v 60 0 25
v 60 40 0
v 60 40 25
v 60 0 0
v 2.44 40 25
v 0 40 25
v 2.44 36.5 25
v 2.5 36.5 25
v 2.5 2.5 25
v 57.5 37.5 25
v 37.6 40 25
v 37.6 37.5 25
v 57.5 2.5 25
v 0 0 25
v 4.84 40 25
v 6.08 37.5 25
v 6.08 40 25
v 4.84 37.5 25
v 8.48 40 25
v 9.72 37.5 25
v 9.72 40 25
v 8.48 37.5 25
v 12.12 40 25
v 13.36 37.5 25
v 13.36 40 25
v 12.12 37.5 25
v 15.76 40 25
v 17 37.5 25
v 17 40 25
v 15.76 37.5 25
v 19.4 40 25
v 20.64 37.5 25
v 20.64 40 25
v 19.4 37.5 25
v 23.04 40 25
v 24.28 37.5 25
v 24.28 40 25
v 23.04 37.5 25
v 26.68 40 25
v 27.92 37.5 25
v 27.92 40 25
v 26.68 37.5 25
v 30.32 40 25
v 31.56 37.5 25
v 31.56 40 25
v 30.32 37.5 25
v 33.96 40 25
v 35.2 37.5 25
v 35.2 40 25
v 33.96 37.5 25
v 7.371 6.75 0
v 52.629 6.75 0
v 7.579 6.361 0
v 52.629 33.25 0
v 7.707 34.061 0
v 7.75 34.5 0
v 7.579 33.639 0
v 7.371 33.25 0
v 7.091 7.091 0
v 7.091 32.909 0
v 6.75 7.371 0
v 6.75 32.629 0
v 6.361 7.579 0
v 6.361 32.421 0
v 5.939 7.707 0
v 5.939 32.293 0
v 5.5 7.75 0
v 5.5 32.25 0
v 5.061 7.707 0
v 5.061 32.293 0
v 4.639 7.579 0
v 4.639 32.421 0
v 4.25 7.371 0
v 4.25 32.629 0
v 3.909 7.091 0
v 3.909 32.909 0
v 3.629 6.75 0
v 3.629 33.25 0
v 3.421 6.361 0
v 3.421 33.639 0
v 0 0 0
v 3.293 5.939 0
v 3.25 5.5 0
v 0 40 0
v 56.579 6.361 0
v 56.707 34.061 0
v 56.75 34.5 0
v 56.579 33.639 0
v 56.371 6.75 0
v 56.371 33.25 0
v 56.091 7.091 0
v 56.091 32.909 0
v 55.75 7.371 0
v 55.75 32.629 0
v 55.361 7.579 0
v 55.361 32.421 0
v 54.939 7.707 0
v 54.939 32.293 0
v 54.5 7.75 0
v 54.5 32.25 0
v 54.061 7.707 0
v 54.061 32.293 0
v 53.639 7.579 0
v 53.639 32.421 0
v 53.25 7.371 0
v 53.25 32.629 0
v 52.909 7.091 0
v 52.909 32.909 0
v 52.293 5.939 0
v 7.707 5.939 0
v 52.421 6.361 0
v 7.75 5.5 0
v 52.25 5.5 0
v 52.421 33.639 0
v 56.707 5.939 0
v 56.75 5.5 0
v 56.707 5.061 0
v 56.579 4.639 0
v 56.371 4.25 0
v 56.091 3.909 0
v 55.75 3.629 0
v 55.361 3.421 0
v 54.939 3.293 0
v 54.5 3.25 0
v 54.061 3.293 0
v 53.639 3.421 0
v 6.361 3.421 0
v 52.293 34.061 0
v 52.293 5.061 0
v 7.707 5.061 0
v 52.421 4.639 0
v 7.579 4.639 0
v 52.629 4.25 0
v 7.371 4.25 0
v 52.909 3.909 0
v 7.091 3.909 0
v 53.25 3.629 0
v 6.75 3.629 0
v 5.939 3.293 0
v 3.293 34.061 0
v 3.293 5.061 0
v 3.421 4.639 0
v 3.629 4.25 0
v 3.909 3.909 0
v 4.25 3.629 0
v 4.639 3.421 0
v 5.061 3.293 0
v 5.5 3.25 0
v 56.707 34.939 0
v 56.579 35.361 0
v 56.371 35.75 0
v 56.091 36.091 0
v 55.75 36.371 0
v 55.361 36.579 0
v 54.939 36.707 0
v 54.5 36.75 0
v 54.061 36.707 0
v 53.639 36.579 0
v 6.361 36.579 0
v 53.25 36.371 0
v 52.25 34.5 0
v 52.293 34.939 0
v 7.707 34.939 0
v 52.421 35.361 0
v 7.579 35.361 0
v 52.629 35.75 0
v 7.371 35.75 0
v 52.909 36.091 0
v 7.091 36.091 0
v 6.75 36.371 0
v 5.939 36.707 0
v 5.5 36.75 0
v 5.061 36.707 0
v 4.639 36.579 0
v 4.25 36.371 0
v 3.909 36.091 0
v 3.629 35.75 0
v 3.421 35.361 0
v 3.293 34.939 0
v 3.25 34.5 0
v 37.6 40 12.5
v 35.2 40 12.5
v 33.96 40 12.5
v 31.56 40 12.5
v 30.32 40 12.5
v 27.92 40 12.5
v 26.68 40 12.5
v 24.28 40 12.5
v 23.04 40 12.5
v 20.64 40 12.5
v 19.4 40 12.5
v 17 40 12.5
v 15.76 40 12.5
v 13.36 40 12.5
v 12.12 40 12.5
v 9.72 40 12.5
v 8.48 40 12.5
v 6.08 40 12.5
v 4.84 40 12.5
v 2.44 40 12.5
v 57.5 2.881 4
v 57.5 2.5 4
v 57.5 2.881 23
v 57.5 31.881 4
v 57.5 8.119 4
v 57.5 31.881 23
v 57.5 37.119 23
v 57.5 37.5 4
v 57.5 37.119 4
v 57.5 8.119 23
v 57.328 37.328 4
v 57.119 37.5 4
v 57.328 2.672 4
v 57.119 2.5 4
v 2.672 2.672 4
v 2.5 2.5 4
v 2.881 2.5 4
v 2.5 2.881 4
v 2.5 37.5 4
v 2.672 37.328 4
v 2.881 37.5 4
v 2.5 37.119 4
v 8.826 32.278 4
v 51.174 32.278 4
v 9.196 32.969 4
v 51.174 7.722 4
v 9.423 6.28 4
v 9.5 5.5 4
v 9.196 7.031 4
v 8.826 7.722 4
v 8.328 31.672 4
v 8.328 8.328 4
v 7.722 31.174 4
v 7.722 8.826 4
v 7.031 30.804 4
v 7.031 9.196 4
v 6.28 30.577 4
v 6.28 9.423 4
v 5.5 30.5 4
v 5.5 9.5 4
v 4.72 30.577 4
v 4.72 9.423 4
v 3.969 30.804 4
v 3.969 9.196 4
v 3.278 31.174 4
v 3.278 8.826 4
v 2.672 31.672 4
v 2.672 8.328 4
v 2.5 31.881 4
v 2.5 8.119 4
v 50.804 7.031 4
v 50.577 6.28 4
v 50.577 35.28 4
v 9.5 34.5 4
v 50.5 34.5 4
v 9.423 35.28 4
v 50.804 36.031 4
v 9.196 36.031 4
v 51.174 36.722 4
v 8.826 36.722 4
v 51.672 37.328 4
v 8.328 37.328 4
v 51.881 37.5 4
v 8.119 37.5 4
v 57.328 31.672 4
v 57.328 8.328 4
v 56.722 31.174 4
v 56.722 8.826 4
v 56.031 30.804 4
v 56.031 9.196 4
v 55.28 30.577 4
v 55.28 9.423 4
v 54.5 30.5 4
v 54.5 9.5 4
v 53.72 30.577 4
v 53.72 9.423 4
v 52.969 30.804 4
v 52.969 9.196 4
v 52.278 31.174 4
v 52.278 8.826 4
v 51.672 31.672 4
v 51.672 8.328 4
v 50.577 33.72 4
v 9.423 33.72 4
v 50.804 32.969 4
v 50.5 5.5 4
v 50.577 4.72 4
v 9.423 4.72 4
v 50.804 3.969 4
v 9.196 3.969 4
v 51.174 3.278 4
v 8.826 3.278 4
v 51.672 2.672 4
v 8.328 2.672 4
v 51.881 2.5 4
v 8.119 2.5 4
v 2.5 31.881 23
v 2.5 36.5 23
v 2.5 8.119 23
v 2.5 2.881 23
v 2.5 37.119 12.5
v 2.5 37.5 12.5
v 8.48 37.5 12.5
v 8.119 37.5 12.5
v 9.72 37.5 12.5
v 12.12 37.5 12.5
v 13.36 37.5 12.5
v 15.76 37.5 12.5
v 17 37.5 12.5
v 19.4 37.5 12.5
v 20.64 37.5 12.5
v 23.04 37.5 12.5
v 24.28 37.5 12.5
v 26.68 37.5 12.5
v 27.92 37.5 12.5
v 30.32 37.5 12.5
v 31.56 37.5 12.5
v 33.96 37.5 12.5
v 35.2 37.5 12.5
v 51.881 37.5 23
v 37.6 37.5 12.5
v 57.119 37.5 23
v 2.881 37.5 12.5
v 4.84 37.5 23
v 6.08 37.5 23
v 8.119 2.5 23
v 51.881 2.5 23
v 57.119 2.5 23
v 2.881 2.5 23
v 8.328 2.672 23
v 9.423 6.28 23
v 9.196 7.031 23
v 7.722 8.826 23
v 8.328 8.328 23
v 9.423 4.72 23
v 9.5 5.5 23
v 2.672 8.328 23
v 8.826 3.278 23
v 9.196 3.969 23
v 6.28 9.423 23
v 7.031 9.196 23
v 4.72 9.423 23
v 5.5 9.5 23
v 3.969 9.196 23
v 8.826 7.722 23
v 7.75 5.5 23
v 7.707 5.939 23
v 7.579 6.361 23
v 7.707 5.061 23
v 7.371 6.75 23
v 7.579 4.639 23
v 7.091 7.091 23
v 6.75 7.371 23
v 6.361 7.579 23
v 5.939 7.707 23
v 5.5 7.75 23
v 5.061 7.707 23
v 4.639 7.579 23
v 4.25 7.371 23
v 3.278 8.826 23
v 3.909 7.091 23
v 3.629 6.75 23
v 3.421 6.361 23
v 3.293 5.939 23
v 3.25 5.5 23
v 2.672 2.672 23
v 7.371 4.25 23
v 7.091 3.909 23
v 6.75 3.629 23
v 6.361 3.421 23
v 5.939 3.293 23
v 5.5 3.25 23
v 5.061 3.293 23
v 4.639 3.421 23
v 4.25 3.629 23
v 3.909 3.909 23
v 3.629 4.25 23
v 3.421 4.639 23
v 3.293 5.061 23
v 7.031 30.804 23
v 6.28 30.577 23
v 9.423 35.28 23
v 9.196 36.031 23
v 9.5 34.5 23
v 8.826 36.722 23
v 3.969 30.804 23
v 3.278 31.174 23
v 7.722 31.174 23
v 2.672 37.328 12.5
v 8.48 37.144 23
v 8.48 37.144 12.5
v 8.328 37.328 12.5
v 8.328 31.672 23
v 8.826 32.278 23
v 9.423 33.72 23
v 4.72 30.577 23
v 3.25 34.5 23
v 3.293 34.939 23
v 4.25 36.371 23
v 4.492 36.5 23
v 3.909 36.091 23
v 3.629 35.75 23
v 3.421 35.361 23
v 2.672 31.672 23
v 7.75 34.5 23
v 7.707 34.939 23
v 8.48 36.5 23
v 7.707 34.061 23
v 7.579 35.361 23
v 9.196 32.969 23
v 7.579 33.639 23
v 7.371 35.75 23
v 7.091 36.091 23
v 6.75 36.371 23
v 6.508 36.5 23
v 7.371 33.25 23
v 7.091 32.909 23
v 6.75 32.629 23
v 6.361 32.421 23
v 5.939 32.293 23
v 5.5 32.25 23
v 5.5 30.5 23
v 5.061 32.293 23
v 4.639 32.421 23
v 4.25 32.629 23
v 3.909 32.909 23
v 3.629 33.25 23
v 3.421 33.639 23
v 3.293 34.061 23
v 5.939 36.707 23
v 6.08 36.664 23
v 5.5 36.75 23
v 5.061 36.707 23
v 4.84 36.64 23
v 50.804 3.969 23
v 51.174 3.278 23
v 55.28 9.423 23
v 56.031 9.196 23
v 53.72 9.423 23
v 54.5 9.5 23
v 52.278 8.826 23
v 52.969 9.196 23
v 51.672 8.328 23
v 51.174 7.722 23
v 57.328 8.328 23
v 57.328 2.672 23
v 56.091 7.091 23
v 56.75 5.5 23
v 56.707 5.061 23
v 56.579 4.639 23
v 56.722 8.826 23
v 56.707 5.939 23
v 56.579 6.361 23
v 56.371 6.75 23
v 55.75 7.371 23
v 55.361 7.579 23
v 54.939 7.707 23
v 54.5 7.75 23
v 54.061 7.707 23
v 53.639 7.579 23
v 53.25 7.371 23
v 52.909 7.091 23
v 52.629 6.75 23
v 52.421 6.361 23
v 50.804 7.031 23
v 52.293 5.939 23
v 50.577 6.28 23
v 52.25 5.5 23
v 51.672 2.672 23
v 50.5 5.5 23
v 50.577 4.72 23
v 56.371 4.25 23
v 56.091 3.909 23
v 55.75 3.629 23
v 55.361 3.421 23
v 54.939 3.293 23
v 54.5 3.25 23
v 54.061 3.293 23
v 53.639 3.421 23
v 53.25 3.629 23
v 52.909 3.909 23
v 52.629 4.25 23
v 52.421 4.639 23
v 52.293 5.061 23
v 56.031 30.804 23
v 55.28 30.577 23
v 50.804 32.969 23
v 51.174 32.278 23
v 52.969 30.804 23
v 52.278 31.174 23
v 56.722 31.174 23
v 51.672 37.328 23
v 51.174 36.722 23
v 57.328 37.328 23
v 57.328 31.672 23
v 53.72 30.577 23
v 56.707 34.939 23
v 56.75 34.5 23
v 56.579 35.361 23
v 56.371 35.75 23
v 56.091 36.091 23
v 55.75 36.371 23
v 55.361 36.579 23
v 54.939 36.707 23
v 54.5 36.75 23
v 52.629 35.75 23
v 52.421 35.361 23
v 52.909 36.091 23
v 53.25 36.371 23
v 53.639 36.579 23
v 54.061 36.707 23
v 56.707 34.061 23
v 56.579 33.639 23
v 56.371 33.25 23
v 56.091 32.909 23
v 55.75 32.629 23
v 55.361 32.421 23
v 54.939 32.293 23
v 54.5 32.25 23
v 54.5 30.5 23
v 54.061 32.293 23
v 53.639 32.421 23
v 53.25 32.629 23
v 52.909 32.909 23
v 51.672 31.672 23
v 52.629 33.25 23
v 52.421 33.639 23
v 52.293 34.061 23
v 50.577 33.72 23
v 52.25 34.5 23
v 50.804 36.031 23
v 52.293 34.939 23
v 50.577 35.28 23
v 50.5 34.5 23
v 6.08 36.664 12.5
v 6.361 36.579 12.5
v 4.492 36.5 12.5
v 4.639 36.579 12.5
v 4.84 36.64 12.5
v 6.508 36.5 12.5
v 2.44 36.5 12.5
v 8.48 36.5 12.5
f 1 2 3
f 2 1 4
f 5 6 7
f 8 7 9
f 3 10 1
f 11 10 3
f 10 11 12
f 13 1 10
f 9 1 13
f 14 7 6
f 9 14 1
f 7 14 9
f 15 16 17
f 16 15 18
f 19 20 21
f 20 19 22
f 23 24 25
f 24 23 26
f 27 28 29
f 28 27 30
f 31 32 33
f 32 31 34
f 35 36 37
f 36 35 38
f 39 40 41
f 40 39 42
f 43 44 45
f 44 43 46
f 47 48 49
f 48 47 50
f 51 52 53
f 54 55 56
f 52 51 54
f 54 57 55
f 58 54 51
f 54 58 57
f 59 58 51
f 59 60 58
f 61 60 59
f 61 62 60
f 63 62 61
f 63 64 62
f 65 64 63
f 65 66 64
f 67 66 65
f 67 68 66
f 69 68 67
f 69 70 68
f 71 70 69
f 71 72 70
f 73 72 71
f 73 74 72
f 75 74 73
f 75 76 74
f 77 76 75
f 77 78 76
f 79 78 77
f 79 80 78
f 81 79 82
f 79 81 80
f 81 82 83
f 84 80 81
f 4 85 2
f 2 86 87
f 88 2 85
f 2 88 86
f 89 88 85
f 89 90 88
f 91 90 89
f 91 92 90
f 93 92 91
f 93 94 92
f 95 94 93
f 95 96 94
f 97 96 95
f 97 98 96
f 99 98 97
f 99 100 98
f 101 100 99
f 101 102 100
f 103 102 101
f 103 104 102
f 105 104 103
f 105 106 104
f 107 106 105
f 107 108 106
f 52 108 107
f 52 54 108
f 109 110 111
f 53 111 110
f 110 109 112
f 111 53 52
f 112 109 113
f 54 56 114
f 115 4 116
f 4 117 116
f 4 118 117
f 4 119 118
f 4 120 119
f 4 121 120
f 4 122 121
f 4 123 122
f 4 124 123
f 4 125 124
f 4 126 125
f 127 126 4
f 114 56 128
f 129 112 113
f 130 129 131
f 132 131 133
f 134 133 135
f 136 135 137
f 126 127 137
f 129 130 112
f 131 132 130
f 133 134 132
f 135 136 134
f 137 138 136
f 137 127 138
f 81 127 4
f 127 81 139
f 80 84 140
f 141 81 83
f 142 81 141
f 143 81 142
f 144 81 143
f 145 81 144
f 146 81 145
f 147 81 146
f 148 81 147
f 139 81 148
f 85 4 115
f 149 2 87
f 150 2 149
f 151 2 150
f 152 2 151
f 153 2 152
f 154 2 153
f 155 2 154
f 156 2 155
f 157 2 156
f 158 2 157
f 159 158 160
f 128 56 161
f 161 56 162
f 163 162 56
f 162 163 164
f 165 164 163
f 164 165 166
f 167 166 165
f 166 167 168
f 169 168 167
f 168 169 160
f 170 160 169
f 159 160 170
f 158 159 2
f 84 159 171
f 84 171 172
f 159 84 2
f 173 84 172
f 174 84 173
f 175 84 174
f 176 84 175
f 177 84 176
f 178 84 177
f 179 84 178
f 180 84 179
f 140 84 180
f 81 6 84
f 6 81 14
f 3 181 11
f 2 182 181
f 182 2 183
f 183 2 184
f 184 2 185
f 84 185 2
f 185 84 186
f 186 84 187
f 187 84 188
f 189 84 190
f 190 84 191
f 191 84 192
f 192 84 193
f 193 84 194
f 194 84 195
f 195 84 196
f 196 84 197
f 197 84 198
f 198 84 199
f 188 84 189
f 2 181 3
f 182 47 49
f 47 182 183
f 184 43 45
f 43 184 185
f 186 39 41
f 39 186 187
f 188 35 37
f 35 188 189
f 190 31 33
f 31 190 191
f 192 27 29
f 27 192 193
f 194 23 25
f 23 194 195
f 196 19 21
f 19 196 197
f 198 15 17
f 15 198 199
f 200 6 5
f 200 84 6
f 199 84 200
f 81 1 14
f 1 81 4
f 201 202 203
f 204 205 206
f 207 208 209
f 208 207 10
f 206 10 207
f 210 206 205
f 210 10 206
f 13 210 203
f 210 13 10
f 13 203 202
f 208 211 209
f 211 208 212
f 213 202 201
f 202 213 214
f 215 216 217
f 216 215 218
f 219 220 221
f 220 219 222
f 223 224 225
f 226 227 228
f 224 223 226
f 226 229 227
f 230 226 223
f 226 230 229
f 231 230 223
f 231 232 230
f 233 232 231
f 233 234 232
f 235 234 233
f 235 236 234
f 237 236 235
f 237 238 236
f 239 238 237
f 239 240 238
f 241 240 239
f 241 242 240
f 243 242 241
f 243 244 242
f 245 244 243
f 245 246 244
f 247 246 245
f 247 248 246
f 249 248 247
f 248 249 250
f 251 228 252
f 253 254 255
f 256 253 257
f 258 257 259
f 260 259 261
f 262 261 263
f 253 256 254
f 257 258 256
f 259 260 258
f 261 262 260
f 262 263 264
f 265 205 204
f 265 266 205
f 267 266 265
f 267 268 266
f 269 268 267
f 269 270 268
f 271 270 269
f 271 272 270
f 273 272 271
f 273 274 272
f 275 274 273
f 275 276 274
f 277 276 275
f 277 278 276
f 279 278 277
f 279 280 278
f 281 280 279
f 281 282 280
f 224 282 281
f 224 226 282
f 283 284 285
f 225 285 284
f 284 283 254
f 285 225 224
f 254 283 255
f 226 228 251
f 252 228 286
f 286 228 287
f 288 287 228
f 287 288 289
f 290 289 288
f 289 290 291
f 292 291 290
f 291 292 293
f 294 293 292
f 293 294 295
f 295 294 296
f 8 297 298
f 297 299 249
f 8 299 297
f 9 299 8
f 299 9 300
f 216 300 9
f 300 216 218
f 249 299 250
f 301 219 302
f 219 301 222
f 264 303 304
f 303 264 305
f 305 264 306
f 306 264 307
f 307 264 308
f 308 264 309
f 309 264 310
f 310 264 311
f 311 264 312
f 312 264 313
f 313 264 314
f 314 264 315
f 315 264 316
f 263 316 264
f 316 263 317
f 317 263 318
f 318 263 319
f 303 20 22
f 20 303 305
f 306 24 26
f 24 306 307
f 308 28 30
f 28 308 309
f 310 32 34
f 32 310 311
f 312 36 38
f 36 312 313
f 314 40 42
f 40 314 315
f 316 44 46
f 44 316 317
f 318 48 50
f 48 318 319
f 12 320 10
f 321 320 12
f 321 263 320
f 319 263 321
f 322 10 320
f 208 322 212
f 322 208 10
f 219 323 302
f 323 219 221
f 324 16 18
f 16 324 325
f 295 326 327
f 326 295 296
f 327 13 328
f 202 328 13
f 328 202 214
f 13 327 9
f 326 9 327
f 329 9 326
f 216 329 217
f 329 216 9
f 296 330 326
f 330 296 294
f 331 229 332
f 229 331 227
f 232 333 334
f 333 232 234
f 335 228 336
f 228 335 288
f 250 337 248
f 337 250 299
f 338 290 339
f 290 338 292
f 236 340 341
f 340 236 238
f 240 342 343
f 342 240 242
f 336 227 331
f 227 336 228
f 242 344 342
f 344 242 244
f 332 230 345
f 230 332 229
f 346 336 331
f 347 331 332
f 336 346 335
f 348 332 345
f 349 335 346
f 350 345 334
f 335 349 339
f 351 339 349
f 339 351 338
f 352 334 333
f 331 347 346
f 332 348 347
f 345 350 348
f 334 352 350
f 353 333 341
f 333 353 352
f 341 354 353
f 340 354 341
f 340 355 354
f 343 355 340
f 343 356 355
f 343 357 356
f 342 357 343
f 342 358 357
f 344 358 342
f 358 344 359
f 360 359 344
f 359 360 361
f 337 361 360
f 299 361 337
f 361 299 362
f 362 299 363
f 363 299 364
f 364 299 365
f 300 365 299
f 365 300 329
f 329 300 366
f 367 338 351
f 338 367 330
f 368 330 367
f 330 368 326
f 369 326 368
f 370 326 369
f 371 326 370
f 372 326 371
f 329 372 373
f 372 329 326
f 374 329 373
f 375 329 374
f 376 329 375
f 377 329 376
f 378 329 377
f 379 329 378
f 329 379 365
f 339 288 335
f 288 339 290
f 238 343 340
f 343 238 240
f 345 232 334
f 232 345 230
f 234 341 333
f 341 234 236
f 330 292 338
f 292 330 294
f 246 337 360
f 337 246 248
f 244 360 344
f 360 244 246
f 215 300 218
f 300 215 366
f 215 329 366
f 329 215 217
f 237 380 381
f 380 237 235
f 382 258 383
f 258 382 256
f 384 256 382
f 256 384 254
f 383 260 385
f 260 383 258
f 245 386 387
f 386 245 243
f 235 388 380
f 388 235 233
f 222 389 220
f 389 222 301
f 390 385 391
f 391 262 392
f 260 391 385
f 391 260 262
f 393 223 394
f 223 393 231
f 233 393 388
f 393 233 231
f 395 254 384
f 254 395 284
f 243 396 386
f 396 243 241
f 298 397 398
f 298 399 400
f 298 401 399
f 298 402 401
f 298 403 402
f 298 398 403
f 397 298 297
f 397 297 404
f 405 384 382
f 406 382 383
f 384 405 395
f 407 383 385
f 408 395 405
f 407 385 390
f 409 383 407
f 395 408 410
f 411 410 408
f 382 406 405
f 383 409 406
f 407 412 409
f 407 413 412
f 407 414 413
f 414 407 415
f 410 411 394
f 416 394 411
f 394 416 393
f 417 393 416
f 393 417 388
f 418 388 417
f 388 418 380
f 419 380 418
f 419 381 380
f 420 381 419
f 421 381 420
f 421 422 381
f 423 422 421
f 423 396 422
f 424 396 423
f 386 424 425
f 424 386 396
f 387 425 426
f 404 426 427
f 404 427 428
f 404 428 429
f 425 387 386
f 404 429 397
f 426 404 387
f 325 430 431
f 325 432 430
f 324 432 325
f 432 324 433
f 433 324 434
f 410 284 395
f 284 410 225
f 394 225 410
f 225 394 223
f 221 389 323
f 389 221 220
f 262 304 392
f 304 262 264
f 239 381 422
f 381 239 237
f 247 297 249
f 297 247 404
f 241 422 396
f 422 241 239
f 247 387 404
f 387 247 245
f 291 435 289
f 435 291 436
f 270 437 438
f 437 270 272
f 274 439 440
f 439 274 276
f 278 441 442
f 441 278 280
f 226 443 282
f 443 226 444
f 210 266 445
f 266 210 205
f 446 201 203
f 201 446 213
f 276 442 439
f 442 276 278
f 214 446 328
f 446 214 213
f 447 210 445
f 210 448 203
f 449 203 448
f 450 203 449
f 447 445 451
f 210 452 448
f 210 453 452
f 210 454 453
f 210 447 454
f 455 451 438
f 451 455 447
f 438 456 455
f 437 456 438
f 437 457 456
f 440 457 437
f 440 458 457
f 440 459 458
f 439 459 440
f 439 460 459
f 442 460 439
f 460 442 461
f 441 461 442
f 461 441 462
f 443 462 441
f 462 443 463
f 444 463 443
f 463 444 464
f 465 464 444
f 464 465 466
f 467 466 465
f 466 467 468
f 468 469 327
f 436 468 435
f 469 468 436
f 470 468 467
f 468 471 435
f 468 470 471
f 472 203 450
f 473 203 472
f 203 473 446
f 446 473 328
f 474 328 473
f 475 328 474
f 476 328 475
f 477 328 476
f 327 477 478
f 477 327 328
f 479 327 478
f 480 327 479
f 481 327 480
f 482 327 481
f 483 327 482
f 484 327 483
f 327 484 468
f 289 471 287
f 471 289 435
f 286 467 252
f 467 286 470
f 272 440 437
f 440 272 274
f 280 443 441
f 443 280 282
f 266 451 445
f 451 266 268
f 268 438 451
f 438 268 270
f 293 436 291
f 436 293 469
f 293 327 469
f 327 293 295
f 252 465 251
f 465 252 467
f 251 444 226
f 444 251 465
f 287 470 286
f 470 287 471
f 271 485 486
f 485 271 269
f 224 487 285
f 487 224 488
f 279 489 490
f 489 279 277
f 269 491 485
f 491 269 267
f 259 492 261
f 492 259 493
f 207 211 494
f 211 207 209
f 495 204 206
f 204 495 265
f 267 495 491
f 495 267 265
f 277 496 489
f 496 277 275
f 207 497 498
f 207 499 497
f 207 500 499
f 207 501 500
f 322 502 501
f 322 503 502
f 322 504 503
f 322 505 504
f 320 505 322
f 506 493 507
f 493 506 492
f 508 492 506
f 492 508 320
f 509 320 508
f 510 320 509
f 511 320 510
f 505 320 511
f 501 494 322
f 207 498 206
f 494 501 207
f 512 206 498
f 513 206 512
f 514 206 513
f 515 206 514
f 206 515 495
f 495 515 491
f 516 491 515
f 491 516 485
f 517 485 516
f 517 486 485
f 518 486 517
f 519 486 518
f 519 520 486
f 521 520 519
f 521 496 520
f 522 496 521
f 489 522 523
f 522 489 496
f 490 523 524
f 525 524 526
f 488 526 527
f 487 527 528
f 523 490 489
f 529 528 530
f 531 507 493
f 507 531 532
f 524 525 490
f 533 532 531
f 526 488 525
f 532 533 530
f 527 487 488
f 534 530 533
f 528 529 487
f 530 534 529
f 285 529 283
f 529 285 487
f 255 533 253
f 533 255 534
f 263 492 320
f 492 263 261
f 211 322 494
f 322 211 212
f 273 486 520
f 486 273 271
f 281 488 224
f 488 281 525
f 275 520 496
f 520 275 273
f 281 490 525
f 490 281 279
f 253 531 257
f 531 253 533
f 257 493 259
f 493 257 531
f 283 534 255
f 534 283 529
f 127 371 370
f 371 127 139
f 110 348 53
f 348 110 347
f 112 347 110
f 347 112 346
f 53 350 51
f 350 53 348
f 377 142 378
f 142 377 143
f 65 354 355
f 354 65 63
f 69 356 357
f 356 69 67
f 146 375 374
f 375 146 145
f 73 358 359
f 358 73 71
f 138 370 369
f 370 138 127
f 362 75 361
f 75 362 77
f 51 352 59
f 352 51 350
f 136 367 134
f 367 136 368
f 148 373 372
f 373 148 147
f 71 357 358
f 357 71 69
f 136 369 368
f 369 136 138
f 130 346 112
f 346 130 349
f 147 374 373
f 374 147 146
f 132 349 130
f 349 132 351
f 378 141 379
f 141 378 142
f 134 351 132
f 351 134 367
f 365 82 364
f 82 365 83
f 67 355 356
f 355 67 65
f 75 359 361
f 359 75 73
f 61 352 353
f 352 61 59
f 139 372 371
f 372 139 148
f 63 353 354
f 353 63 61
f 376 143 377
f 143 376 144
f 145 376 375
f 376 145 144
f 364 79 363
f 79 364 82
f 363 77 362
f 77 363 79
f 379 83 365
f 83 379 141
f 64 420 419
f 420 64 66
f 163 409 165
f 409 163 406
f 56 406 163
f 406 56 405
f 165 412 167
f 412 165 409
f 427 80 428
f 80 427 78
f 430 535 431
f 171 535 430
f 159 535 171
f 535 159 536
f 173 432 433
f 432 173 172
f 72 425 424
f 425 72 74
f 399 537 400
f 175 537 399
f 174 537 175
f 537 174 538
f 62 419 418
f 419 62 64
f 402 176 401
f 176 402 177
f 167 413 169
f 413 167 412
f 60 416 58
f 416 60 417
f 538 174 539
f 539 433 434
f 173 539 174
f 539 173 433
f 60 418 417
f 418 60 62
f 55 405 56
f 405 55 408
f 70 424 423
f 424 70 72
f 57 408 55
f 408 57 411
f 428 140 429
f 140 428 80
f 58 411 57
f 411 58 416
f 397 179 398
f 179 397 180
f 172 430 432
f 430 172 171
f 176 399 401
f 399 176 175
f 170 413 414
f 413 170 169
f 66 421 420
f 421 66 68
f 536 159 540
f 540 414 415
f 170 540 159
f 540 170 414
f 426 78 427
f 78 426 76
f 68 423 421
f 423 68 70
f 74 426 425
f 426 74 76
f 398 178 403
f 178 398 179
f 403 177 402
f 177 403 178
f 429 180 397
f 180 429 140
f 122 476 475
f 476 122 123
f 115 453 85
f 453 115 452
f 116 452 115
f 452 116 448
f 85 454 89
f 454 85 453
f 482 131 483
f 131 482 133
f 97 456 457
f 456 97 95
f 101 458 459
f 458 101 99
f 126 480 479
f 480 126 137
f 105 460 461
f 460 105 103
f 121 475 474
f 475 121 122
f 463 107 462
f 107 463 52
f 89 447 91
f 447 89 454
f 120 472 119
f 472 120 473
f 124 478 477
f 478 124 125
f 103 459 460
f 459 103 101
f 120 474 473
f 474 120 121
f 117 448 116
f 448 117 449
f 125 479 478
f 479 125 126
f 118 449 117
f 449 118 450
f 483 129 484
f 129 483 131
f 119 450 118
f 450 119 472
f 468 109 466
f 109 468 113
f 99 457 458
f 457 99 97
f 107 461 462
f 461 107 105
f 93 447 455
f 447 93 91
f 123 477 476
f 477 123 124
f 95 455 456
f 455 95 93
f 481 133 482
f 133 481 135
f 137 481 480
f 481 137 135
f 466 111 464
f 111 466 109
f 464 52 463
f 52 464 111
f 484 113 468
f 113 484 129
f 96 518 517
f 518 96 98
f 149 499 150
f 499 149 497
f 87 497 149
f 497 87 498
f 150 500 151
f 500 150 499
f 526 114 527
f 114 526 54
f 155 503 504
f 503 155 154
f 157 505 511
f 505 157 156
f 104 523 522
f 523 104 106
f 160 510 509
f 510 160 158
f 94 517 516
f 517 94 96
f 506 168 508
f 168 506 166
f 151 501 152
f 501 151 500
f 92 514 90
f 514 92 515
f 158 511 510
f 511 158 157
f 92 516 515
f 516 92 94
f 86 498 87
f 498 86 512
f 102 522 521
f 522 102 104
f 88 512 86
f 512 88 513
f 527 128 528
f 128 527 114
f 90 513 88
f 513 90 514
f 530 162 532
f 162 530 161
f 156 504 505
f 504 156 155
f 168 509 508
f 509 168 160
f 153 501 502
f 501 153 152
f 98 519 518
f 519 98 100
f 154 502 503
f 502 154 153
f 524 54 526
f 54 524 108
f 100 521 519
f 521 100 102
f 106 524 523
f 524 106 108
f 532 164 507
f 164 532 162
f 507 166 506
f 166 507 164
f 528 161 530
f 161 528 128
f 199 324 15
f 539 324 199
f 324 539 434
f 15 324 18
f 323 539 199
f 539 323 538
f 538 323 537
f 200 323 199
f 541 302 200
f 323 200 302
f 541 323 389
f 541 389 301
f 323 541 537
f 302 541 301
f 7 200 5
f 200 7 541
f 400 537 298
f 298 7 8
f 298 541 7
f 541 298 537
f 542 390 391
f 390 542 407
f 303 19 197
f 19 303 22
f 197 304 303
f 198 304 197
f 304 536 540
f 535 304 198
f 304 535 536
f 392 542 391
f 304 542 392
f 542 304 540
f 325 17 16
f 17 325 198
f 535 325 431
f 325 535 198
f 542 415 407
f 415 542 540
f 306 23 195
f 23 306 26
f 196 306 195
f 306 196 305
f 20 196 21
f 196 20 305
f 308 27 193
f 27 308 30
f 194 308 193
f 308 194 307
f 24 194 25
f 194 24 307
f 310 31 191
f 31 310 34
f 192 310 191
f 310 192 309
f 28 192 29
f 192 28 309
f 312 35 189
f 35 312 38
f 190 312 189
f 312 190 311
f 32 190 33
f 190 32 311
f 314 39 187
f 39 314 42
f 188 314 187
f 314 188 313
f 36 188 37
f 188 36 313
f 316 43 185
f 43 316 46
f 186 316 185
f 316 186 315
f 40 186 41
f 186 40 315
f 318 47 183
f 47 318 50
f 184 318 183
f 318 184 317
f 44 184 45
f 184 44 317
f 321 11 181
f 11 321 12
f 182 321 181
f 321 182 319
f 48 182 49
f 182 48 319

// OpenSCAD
$fn = 32;

// ----------------------------------------------------------------------
// Enclosure body: 60 x 40 x 25 mm, wall 2.5 mm
// ----------------------------------------------------------------------

// --- parameters (mm) ---
length = 60;              // outside length, X
width = 40;               // outside width, Y
height = 25;              // outside height, Z
wall = 2.5;               // side wall thickness
floor_t = 4;              // floor thickness
boss_d = 8;               // corner boss diameter
boss_h = 19;              // corner boss height above the floor
boss_hole_d = 4.5;        // lid screw clearance in the boss
boss_lip = 5.5;           // boss centre inset from the corner
vent_slots = 10;          // vent slots in the long wall
vent_w = 2.4;             // vent slot width
vent_h = 16;              // vent slot height
vent_pitch = 3.64;        // vent slot pitch
vent_z = 12.5;            // vent slot sill height

module shell() {
  difference() {
    cube([length, width, height]);
    /* hollow, open at the top */
    translate([wall, wall, floor_t])
      cube([length - 2 * wall, width - 2 * wall, height]);
  }
}

module bosses() {
  /* corner bosses, sunk 1 mm into the floor */
  for (sx = [0, 1]) for (sy = [0, 1])
    translate([sx * (length - 2 * boss_lip) + boss_lip, sy * (width - 2 * boss_lip) + boss_lip, floor_t - 1])
      cylinder(h = boss_h + 1, d = boss_d);
}

difference() {
  union() {
    shell();
    bosses();
  }
  /* boss screw holes */
  for (sx = [0, 1]) for (sy = [0, 1])
    translate([sx * (length - 2 * boss_lip) + boss_lip, sy * (width - 2 * boss_lip) + boss_lip, -1]) cylinder(h = floor_t + boss_h + 2, d = boss_hole_d);
  /* vent grille in the +Y wall */
  for (i = [0 : vent_slots - 1]) translate([vent_pitch * (i + 1) - vent_w / 2, width - wall - 1, vent_z]) cube([vent_w, wall + 2, vent_h]);
}
